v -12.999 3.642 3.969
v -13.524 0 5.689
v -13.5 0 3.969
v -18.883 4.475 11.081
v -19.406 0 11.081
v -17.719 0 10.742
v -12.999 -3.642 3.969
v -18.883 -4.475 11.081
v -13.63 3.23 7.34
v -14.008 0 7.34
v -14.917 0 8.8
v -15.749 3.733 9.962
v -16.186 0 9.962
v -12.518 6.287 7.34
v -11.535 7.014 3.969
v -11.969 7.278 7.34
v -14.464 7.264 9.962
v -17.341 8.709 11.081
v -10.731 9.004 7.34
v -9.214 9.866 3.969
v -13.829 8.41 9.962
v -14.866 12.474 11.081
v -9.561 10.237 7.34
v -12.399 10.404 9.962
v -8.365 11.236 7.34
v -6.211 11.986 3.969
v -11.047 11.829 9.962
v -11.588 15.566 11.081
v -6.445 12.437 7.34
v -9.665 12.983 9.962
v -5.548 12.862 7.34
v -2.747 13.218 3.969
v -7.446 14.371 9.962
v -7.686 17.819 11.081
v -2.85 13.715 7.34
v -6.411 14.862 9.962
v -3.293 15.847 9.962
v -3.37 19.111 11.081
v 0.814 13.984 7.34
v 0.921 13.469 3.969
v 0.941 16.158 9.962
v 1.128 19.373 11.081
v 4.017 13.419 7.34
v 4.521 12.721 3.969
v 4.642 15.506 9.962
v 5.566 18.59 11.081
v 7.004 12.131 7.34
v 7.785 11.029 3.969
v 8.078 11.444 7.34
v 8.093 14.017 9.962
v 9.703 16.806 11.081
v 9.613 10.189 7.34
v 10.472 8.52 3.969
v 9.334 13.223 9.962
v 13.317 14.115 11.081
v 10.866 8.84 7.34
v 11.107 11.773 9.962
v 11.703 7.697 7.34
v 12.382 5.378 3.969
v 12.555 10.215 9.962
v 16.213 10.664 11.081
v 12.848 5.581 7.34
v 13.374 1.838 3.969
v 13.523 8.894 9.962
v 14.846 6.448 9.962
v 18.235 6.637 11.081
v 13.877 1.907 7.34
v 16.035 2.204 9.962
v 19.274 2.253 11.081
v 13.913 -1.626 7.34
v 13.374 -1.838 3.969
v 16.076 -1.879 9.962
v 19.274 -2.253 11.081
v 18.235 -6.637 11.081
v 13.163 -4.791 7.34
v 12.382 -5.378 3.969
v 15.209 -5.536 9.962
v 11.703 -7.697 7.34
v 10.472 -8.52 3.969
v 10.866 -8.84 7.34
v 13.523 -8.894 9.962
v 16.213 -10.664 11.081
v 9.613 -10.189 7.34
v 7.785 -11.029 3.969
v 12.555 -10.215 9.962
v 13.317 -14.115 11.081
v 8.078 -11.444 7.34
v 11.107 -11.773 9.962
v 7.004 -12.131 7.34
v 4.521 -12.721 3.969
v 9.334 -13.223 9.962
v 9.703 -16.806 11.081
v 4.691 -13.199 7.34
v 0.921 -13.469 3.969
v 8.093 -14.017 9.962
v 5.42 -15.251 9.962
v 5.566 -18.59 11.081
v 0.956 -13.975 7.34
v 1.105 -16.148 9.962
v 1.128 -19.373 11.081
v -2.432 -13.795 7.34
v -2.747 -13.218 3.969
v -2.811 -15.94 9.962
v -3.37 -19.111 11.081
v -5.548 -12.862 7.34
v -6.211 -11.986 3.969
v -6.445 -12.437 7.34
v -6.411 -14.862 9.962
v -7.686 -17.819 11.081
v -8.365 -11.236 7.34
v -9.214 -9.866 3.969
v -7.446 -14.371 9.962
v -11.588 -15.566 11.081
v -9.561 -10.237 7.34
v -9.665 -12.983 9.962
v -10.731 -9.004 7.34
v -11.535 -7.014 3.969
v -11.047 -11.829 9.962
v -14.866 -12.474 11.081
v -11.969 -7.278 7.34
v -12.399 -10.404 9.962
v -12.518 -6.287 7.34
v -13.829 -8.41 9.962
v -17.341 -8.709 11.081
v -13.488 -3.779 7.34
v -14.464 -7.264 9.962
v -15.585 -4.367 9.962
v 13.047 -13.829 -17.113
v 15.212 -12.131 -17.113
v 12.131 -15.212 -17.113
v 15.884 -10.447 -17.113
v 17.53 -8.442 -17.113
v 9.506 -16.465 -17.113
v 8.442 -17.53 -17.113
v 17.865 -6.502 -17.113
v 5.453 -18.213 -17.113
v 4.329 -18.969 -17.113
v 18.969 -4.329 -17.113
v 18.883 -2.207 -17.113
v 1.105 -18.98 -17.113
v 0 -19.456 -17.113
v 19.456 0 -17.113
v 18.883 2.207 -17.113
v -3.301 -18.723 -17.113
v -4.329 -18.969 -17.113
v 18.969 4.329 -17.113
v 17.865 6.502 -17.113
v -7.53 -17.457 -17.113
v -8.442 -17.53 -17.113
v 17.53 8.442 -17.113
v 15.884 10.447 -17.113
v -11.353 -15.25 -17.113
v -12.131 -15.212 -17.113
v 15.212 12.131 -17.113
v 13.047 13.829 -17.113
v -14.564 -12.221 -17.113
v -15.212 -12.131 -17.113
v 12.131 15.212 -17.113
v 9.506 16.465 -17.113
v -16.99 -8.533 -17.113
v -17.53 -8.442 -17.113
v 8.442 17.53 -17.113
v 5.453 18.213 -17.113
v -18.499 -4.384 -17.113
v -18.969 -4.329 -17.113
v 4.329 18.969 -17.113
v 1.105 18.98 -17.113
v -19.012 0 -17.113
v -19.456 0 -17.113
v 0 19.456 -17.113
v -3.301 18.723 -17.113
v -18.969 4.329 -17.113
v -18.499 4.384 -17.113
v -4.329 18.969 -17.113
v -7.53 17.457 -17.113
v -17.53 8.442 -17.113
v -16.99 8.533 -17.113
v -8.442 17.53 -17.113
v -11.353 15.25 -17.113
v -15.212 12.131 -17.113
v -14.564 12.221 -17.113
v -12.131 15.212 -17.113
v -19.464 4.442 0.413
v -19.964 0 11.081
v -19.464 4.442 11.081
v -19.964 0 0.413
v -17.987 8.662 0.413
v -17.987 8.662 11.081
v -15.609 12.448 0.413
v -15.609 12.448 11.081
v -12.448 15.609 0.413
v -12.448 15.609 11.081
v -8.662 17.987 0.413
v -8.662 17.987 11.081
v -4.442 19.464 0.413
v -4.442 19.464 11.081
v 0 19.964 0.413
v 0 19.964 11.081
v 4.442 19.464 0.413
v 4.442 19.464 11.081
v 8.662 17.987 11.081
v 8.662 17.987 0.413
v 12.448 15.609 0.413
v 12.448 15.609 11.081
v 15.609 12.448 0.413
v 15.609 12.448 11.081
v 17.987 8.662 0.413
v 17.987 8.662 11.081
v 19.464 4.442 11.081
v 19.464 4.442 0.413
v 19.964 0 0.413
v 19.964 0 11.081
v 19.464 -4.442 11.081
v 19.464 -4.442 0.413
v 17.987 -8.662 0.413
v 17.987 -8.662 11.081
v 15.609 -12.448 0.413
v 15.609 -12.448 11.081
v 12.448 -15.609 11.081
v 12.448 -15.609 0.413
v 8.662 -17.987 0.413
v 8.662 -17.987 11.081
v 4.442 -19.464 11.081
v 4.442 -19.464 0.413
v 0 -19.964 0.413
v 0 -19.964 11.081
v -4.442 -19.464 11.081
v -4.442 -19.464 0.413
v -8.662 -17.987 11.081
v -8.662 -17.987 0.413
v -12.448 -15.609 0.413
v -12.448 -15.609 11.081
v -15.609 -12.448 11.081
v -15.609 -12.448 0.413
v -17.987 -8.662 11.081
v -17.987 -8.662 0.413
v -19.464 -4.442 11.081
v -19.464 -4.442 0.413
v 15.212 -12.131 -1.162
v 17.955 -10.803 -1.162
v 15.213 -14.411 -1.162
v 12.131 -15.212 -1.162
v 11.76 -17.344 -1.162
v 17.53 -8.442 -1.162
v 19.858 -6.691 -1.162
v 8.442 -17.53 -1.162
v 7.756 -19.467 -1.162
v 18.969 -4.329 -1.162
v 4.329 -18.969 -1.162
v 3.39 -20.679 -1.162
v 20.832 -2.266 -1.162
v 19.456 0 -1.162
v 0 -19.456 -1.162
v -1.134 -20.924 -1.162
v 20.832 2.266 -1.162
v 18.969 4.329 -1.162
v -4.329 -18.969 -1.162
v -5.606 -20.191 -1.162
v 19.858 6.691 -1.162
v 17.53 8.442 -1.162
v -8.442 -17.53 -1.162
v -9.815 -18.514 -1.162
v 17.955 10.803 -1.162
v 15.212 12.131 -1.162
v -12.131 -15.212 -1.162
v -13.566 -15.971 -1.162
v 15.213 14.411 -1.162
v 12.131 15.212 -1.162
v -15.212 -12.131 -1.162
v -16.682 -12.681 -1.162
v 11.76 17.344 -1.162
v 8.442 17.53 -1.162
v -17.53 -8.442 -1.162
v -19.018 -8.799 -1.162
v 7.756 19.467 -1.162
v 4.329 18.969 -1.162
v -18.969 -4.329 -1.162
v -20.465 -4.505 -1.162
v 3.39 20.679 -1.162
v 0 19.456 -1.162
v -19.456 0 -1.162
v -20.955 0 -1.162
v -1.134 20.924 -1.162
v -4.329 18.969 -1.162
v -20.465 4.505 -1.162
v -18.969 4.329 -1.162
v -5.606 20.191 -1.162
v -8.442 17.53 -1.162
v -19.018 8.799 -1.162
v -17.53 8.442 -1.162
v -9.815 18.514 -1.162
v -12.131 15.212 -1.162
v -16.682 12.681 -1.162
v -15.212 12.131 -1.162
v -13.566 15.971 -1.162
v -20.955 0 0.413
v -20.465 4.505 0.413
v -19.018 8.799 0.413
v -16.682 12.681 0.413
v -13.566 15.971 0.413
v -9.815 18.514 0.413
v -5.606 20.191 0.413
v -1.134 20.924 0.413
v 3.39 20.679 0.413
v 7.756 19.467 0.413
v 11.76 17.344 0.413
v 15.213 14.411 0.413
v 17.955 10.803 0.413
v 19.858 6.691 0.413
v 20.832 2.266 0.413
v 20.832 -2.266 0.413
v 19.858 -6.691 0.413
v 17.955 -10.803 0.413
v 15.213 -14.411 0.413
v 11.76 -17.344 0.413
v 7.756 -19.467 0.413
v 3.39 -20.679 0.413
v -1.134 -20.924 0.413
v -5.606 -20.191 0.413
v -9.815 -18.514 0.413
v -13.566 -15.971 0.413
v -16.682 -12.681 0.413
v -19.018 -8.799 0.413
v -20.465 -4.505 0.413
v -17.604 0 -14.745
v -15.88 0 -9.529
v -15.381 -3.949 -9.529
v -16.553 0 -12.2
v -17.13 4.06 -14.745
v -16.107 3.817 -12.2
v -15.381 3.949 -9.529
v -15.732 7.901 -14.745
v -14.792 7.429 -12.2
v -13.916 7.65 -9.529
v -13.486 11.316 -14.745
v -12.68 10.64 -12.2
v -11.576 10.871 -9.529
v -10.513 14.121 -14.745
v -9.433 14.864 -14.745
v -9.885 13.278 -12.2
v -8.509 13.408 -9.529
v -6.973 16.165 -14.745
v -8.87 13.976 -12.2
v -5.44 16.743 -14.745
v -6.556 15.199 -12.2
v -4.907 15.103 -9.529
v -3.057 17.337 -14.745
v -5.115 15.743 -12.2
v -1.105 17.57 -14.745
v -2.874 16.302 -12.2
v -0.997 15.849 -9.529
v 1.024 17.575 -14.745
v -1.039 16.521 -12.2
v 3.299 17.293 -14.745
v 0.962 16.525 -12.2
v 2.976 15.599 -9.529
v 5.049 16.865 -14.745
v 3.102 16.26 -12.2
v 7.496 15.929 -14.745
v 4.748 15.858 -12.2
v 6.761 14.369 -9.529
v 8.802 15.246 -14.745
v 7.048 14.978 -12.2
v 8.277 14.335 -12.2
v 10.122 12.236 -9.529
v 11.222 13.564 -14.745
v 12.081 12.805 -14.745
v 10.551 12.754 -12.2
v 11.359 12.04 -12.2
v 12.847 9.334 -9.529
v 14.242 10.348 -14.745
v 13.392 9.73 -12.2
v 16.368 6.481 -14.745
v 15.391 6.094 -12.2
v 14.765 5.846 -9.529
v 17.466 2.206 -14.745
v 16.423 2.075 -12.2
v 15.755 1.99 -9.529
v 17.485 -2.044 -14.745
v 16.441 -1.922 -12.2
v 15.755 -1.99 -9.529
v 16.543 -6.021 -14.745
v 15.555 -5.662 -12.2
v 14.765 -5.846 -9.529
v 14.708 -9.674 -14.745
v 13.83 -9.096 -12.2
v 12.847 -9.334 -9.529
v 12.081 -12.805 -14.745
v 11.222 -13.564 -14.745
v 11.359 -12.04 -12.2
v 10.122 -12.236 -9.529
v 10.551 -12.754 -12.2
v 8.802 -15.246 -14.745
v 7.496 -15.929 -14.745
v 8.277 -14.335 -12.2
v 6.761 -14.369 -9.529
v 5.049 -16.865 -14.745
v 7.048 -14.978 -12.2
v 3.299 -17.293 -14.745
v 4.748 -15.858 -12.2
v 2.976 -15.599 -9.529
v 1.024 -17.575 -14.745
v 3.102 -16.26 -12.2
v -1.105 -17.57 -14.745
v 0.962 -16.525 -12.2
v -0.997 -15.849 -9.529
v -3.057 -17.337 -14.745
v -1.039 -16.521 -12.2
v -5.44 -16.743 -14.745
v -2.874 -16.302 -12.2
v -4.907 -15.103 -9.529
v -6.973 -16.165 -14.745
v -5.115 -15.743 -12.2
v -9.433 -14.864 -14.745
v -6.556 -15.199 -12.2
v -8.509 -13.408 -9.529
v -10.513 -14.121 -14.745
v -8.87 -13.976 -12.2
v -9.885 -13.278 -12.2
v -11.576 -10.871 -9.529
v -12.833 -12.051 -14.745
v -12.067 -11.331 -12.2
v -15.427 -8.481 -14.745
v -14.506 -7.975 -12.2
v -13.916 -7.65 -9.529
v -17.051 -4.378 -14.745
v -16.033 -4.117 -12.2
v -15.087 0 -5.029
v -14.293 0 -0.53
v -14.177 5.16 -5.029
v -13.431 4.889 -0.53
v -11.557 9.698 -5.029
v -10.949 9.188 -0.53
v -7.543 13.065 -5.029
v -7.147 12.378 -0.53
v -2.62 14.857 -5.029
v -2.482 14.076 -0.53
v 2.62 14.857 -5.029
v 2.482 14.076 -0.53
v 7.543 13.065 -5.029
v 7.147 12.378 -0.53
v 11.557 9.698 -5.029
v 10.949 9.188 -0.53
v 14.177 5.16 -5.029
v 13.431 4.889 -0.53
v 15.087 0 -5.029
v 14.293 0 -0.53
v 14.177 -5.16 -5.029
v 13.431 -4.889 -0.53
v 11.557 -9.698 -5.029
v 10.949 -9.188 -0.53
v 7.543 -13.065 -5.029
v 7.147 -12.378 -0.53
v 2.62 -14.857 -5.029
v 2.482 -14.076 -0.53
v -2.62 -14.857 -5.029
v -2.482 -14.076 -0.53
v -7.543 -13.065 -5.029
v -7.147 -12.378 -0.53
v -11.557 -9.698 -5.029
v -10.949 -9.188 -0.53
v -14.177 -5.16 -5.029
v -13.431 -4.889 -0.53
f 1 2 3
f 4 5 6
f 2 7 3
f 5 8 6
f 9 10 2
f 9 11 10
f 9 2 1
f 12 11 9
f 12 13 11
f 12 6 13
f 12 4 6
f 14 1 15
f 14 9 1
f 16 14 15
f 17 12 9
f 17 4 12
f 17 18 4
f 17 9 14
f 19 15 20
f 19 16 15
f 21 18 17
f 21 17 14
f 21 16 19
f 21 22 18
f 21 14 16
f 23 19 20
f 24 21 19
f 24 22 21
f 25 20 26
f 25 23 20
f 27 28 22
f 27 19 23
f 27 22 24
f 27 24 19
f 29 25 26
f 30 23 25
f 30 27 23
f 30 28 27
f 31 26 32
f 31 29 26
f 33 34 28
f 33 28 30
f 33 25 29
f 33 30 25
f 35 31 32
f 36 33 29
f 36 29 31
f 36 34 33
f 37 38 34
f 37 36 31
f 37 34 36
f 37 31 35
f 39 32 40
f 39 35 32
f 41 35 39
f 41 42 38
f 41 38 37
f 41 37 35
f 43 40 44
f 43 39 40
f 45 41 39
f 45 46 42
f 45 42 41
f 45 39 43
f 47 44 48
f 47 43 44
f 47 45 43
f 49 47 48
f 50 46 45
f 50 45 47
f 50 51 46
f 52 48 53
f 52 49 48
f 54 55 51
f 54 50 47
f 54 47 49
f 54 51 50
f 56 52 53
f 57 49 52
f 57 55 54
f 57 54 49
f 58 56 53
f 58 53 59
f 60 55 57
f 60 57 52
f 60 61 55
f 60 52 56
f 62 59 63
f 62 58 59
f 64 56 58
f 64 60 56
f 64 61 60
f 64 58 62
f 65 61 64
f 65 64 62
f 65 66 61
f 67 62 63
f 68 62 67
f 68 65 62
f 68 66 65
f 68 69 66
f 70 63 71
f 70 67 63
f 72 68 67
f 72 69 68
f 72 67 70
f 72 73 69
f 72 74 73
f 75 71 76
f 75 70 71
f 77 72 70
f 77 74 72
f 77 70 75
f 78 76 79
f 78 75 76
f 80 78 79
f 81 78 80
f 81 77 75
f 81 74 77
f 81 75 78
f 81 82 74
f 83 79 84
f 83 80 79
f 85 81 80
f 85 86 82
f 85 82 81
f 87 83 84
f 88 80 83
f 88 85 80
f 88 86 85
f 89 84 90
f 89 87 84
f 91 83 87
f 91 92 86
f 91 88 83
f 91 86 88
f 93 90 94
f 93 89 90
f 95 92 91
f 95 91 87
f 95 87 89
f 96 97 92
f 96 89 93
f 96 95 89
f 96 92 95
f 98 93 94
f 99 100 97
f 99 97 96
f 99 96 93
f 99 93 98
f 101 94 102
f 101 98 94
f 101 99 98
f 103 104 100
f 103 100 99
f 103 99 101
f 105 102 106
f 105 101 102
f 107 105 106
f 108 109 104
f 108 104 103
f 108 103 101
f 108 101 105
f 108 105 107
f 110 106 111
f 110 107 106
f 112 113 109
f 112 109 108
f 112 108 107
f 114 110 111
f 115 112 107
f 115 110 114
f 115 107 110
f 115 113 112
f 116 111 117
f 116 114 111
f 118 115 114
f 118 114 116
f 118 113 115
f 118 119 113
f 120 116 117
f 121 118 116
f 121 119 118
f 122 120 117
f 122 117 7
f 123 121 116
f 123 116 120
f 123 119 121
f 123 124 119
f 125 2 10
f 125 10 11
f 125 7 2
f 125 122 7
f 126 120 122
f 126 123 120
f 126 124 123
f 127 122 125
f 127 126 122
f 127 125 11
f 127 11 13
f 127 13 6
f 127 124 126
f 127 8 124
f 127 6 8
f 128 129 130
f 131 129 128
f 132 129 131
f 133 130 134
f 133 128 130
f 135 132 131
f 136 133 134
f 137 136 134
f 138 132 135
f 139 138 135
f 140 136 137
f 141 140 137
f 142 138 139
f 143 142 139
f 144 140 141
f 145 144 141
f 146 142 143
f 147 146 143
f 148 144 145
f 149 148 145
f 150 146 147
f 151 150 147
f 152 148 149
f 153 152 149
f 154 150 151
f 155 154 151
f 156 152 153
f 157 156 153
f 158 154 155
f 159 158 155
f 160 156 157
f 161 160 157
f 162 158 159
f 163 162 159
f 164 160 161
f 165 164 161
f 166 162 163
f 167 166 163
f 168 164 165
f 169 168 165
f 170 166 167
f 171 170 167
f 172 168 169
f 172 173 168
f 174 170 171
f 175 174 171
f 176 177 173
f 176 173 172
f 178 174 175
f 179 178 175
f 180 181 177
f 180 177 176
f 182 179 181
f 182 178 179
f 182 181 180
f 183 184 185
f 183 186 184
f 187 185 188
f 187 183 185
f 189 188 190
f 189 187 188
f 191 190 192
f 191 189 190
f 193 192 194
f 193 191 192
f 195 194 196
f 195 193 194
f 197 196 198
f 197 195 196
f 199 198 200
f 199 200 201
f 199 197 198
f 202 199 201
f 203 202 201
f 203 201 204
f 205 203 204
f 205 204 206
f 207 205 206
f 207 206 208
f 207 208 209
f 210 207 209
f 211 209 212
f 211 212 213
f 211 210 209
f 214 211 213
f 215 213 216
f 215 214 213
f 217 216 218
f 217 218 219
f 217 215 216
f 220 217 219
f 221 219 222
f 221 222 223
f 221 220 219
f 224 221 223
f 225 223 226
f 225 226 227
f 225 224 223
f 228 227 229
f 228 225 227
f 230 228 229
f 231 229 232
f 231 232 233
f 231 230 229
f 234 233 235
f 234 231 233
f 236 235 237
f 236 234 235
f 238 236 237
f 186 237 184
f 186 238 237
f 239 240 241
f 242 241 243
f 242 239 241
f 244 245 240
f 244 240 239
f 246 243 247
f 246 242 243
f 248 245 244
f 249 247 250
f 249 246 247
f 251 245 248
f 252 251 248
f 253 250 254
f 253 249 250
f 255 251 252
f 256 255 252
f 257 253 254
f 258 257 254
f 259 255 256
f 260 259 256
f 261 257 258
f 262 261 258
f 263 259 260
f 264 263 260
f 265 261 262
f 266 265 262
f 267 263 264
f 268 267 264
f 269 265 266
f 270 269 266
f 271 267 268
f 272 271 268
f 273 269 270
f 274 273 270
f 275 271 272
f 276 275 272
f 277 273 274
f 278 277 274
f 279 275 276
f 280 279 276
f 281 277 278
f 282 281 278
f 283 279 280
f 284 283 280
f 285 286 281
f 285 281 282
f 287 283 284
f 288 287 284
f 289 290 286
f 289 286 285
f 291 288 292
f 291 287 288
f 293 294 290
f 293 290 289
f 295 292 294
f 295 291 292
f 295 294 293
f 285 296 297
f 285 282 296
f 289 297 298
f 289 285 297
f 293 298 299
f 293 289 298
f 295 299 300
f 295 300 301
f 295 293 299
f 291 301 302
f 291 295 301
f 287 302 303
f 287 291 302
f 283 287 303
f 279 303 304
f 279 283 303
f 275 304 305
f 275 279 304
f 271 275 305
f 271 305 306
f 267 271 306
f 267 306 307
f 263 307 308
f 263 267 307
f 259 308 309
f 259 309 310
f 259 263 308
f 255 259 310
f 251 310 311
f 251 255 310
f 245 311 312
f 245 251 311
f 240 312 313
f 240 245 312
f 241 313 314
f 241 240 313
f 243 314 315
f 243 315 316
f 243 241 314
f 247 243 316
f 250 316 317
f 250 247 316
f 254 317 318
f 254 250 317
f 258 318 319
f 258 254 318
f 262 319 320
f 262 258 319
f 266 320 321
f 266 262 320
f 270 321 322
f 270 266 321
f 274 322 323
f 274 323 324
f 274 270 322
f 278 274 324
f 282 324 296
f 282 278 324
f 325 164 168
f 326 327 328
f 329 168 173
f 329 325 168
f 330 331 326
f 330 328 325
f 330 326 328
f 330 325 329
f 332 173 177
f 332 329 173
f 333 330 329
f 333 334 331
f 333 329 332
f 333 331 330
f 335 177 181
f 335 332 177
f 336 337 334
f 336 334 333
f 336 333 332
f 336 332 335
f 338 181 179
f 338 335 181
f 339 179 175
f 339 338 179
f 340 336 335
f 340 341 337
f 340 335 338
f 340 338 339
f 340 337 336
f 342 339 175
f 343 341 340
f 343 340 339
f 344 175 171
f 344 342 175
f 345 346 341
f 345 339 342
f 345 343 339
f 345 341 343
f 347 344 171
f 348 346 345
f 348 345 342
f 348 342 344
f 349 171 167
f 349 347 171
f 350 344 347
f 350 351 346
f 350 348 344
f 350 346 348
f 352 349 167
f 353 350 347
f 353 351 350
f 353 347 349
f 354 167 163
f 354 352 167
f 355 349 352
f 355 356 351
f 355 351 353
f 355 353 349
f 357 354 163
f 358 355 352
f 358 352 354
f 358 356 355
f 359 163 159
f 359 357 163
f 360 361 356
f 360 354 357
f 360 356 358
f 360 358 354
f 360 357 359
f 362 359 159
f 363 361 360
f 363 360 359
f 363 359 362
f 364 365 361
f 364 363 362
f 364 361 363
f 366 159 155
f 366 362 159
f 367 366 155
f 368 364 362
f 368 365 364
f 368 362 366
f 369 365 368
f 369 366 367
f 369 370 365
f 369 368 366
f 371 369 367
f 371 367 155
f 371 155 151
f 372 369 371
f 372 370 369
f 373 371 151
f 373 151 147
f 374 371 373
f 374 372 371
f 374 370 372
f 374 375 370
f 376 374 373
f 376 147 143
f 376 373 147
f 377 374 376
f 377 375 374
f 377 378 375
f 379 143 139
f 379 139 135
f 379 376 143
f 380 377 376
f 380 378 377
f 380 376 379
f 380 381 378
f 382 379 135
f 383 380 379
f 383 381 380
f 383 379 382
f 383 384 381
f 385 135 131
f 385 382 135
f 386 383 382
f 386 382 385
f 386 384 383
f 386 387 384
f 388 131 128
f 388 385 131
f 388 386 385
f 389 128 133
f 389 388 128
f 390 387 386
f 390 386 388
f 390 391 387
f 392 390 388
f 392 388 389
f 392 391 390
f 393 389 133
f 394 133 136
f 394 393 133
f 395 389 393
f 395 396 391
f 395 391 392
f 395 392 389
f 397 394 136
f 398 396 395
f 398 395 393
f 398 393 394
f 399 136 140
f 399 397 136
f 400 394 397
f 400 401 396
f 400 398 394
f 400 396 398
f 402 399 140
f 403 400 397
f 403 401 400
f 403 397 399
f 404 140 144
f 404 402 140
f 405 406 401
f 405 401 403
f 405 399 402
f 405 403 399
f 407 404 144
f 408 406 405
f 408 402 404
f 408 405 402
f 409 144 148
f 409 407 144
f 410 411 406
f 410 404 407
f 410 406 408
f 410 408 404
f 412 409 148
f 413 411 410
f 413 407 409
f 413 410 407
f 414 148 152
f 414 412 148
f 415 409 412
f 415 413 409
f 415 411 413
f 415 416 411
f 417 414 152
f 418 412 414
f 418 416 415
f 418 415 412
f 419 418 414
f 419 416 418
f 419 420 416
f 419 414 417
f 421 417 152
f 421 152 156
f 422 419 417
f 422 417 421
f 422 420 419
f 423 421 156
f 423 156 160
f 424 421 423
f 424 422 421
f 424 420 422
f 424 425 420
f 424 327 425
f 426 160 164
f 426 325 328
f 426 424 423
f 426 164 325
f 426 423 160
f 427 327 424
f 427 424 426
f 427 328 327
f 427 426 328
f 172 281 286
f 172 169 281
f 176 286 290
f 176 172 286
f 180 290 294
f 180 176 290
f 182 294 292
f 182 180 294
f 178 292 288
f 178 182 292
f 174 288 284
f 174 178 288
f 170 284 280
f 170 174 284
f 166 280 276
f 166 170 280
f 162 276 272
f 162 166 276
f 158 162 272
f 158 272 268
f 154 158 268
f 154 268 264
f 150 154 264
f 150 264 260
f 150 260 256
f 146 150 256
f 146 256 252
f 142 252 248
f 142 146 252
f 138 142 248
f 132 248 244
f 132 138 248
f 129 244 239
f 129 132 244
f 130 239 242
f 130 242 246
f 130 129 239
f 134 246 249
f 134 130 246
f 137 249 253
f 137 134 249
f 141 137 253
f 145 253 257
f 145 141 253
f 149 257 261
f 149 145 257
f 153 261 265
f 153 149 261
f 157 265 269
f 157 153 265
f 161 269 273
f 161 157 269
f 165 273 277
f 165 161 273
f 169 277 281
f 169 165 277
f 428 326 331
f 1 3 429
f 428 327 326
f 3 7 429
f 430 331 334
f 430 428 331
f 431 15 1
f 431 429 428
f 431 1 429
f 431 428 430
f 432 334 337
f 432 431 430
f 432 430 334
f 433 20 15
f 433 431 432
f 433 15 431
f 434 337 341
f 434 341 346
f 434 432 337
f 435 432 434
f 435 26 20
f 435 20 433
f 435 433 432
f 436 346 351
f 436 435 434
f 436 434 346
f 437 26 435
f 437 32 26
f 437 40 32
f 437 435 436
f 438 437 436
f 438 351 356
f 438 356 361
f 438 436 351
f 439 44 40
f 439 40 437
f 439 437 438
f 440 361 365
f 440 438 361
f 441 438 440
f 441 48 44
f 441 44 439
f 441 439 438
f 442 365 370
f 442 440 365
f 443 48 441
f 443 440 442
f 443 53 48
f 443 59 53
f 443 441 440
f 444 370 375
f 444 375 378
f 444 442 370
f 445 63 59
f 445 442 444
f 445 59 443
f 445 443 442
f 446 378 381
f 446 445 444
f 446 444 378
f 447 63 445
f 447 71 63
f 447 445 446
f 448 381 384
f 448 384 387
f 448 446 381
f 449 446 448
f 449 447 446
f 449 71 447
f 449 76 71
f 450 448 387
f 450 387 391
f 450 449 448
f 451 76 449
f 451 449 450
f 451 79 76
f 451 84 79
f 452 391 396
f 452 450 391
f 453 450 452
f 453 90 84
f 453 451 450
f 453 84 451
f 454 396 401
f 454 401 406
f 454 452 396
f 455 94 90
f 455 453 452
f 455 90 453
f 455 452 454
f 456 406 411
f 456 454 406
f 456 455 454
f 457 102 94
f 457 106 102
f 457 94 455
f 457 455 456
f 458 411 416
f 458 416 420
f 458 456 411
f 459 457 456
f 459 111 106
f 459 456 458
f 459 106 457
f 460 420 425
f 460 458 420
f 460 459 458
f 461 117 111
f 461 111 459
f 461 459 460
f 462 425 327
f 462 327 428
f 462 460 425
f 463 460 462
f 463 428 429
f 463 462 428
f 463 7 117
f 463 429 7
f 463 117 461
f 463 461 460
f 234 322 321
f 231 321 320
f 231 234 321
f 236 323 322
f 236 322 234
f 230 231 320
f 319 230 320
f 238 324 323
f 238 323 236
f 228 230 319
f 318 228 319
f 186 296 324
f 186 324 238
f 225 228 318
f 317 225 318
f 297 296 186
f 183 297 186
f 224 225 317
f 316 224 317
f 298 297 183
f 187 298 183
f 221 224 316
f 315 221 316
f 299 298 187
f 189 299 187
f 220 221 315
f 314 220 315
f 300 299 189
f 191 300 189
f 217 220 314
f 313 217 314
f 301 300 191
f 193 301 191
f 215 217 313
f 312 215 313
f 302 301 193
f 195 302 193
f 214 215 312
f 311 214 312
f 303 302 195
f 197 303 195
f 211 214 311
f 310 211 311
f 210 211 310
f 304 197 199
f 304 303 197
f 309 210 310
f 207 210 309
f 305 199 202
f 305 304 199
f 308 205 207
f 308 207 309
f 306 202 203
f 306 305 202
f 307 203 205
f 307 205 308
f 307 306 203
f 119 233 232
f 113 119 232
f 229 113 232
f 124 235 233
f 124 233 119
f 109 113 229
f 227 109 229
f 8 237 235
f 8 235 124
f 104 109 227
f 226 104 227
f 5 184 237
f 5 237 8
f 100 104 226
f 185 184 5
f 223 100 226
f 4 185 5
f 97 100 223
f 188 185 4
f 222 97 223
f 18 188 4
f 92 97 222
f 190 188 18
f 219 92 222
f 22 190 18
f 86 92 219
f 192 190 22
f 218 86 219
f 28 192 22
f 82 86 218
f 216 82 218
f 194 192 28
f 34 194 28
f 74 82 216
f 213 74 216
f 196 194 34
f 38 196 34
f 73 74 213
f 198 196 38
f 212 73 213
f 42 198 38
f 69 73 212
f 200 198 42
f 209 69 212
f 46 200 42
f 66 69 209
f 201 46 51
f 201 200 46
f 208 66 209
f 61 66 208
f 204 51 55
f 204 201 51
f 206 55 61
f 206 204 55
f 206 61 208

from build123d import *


# Not quite as in the source:
# - a feature names something its author has since deleted; it is built from what else it names


with BuildPart() as f1:
    # F0 (on Front) → F1 (revolve)
    with BuildSketch(Plane.XZ):
        with BuildLine():
            Line((-19.9644, 0.412851112), (-20.955, 0.412851112))
            Line((-20.955, 0.412851112), (-20.955, -1.161948888))
            Line((-20.955, -1.161948888), (-19.4564, -1.161948888))
            Line((-19.4564, -1.161948888), (-19.4564, -17.113148888))
            Line((-19.4564, -17.113148888), (-19.0119, -17.113148888))
            ThreePointArc((-19.0119, -17.113148888), (-17.0327575285, -13.4915583263), (-15.8800452648, -9.52870865))
            Line((-15.8800452648, -9.52870865), (-13.5, 3.9691987902))
            ThreePointArc((-13.5, 3.9691987902), (-14.9174256152, 8.8000179565), (-19.4056, 11.080851112))
            Line((-19.4056, 11.080851112), (-19.9644, 11.080851112))
            Line((-19.9644, 11.080851112), (-19.9644, 0.412851112))
        make_face()
    revolve(axis=Axis((0, 0, 12.5831294567), (0, 0, -1)))


solid = f1.part
